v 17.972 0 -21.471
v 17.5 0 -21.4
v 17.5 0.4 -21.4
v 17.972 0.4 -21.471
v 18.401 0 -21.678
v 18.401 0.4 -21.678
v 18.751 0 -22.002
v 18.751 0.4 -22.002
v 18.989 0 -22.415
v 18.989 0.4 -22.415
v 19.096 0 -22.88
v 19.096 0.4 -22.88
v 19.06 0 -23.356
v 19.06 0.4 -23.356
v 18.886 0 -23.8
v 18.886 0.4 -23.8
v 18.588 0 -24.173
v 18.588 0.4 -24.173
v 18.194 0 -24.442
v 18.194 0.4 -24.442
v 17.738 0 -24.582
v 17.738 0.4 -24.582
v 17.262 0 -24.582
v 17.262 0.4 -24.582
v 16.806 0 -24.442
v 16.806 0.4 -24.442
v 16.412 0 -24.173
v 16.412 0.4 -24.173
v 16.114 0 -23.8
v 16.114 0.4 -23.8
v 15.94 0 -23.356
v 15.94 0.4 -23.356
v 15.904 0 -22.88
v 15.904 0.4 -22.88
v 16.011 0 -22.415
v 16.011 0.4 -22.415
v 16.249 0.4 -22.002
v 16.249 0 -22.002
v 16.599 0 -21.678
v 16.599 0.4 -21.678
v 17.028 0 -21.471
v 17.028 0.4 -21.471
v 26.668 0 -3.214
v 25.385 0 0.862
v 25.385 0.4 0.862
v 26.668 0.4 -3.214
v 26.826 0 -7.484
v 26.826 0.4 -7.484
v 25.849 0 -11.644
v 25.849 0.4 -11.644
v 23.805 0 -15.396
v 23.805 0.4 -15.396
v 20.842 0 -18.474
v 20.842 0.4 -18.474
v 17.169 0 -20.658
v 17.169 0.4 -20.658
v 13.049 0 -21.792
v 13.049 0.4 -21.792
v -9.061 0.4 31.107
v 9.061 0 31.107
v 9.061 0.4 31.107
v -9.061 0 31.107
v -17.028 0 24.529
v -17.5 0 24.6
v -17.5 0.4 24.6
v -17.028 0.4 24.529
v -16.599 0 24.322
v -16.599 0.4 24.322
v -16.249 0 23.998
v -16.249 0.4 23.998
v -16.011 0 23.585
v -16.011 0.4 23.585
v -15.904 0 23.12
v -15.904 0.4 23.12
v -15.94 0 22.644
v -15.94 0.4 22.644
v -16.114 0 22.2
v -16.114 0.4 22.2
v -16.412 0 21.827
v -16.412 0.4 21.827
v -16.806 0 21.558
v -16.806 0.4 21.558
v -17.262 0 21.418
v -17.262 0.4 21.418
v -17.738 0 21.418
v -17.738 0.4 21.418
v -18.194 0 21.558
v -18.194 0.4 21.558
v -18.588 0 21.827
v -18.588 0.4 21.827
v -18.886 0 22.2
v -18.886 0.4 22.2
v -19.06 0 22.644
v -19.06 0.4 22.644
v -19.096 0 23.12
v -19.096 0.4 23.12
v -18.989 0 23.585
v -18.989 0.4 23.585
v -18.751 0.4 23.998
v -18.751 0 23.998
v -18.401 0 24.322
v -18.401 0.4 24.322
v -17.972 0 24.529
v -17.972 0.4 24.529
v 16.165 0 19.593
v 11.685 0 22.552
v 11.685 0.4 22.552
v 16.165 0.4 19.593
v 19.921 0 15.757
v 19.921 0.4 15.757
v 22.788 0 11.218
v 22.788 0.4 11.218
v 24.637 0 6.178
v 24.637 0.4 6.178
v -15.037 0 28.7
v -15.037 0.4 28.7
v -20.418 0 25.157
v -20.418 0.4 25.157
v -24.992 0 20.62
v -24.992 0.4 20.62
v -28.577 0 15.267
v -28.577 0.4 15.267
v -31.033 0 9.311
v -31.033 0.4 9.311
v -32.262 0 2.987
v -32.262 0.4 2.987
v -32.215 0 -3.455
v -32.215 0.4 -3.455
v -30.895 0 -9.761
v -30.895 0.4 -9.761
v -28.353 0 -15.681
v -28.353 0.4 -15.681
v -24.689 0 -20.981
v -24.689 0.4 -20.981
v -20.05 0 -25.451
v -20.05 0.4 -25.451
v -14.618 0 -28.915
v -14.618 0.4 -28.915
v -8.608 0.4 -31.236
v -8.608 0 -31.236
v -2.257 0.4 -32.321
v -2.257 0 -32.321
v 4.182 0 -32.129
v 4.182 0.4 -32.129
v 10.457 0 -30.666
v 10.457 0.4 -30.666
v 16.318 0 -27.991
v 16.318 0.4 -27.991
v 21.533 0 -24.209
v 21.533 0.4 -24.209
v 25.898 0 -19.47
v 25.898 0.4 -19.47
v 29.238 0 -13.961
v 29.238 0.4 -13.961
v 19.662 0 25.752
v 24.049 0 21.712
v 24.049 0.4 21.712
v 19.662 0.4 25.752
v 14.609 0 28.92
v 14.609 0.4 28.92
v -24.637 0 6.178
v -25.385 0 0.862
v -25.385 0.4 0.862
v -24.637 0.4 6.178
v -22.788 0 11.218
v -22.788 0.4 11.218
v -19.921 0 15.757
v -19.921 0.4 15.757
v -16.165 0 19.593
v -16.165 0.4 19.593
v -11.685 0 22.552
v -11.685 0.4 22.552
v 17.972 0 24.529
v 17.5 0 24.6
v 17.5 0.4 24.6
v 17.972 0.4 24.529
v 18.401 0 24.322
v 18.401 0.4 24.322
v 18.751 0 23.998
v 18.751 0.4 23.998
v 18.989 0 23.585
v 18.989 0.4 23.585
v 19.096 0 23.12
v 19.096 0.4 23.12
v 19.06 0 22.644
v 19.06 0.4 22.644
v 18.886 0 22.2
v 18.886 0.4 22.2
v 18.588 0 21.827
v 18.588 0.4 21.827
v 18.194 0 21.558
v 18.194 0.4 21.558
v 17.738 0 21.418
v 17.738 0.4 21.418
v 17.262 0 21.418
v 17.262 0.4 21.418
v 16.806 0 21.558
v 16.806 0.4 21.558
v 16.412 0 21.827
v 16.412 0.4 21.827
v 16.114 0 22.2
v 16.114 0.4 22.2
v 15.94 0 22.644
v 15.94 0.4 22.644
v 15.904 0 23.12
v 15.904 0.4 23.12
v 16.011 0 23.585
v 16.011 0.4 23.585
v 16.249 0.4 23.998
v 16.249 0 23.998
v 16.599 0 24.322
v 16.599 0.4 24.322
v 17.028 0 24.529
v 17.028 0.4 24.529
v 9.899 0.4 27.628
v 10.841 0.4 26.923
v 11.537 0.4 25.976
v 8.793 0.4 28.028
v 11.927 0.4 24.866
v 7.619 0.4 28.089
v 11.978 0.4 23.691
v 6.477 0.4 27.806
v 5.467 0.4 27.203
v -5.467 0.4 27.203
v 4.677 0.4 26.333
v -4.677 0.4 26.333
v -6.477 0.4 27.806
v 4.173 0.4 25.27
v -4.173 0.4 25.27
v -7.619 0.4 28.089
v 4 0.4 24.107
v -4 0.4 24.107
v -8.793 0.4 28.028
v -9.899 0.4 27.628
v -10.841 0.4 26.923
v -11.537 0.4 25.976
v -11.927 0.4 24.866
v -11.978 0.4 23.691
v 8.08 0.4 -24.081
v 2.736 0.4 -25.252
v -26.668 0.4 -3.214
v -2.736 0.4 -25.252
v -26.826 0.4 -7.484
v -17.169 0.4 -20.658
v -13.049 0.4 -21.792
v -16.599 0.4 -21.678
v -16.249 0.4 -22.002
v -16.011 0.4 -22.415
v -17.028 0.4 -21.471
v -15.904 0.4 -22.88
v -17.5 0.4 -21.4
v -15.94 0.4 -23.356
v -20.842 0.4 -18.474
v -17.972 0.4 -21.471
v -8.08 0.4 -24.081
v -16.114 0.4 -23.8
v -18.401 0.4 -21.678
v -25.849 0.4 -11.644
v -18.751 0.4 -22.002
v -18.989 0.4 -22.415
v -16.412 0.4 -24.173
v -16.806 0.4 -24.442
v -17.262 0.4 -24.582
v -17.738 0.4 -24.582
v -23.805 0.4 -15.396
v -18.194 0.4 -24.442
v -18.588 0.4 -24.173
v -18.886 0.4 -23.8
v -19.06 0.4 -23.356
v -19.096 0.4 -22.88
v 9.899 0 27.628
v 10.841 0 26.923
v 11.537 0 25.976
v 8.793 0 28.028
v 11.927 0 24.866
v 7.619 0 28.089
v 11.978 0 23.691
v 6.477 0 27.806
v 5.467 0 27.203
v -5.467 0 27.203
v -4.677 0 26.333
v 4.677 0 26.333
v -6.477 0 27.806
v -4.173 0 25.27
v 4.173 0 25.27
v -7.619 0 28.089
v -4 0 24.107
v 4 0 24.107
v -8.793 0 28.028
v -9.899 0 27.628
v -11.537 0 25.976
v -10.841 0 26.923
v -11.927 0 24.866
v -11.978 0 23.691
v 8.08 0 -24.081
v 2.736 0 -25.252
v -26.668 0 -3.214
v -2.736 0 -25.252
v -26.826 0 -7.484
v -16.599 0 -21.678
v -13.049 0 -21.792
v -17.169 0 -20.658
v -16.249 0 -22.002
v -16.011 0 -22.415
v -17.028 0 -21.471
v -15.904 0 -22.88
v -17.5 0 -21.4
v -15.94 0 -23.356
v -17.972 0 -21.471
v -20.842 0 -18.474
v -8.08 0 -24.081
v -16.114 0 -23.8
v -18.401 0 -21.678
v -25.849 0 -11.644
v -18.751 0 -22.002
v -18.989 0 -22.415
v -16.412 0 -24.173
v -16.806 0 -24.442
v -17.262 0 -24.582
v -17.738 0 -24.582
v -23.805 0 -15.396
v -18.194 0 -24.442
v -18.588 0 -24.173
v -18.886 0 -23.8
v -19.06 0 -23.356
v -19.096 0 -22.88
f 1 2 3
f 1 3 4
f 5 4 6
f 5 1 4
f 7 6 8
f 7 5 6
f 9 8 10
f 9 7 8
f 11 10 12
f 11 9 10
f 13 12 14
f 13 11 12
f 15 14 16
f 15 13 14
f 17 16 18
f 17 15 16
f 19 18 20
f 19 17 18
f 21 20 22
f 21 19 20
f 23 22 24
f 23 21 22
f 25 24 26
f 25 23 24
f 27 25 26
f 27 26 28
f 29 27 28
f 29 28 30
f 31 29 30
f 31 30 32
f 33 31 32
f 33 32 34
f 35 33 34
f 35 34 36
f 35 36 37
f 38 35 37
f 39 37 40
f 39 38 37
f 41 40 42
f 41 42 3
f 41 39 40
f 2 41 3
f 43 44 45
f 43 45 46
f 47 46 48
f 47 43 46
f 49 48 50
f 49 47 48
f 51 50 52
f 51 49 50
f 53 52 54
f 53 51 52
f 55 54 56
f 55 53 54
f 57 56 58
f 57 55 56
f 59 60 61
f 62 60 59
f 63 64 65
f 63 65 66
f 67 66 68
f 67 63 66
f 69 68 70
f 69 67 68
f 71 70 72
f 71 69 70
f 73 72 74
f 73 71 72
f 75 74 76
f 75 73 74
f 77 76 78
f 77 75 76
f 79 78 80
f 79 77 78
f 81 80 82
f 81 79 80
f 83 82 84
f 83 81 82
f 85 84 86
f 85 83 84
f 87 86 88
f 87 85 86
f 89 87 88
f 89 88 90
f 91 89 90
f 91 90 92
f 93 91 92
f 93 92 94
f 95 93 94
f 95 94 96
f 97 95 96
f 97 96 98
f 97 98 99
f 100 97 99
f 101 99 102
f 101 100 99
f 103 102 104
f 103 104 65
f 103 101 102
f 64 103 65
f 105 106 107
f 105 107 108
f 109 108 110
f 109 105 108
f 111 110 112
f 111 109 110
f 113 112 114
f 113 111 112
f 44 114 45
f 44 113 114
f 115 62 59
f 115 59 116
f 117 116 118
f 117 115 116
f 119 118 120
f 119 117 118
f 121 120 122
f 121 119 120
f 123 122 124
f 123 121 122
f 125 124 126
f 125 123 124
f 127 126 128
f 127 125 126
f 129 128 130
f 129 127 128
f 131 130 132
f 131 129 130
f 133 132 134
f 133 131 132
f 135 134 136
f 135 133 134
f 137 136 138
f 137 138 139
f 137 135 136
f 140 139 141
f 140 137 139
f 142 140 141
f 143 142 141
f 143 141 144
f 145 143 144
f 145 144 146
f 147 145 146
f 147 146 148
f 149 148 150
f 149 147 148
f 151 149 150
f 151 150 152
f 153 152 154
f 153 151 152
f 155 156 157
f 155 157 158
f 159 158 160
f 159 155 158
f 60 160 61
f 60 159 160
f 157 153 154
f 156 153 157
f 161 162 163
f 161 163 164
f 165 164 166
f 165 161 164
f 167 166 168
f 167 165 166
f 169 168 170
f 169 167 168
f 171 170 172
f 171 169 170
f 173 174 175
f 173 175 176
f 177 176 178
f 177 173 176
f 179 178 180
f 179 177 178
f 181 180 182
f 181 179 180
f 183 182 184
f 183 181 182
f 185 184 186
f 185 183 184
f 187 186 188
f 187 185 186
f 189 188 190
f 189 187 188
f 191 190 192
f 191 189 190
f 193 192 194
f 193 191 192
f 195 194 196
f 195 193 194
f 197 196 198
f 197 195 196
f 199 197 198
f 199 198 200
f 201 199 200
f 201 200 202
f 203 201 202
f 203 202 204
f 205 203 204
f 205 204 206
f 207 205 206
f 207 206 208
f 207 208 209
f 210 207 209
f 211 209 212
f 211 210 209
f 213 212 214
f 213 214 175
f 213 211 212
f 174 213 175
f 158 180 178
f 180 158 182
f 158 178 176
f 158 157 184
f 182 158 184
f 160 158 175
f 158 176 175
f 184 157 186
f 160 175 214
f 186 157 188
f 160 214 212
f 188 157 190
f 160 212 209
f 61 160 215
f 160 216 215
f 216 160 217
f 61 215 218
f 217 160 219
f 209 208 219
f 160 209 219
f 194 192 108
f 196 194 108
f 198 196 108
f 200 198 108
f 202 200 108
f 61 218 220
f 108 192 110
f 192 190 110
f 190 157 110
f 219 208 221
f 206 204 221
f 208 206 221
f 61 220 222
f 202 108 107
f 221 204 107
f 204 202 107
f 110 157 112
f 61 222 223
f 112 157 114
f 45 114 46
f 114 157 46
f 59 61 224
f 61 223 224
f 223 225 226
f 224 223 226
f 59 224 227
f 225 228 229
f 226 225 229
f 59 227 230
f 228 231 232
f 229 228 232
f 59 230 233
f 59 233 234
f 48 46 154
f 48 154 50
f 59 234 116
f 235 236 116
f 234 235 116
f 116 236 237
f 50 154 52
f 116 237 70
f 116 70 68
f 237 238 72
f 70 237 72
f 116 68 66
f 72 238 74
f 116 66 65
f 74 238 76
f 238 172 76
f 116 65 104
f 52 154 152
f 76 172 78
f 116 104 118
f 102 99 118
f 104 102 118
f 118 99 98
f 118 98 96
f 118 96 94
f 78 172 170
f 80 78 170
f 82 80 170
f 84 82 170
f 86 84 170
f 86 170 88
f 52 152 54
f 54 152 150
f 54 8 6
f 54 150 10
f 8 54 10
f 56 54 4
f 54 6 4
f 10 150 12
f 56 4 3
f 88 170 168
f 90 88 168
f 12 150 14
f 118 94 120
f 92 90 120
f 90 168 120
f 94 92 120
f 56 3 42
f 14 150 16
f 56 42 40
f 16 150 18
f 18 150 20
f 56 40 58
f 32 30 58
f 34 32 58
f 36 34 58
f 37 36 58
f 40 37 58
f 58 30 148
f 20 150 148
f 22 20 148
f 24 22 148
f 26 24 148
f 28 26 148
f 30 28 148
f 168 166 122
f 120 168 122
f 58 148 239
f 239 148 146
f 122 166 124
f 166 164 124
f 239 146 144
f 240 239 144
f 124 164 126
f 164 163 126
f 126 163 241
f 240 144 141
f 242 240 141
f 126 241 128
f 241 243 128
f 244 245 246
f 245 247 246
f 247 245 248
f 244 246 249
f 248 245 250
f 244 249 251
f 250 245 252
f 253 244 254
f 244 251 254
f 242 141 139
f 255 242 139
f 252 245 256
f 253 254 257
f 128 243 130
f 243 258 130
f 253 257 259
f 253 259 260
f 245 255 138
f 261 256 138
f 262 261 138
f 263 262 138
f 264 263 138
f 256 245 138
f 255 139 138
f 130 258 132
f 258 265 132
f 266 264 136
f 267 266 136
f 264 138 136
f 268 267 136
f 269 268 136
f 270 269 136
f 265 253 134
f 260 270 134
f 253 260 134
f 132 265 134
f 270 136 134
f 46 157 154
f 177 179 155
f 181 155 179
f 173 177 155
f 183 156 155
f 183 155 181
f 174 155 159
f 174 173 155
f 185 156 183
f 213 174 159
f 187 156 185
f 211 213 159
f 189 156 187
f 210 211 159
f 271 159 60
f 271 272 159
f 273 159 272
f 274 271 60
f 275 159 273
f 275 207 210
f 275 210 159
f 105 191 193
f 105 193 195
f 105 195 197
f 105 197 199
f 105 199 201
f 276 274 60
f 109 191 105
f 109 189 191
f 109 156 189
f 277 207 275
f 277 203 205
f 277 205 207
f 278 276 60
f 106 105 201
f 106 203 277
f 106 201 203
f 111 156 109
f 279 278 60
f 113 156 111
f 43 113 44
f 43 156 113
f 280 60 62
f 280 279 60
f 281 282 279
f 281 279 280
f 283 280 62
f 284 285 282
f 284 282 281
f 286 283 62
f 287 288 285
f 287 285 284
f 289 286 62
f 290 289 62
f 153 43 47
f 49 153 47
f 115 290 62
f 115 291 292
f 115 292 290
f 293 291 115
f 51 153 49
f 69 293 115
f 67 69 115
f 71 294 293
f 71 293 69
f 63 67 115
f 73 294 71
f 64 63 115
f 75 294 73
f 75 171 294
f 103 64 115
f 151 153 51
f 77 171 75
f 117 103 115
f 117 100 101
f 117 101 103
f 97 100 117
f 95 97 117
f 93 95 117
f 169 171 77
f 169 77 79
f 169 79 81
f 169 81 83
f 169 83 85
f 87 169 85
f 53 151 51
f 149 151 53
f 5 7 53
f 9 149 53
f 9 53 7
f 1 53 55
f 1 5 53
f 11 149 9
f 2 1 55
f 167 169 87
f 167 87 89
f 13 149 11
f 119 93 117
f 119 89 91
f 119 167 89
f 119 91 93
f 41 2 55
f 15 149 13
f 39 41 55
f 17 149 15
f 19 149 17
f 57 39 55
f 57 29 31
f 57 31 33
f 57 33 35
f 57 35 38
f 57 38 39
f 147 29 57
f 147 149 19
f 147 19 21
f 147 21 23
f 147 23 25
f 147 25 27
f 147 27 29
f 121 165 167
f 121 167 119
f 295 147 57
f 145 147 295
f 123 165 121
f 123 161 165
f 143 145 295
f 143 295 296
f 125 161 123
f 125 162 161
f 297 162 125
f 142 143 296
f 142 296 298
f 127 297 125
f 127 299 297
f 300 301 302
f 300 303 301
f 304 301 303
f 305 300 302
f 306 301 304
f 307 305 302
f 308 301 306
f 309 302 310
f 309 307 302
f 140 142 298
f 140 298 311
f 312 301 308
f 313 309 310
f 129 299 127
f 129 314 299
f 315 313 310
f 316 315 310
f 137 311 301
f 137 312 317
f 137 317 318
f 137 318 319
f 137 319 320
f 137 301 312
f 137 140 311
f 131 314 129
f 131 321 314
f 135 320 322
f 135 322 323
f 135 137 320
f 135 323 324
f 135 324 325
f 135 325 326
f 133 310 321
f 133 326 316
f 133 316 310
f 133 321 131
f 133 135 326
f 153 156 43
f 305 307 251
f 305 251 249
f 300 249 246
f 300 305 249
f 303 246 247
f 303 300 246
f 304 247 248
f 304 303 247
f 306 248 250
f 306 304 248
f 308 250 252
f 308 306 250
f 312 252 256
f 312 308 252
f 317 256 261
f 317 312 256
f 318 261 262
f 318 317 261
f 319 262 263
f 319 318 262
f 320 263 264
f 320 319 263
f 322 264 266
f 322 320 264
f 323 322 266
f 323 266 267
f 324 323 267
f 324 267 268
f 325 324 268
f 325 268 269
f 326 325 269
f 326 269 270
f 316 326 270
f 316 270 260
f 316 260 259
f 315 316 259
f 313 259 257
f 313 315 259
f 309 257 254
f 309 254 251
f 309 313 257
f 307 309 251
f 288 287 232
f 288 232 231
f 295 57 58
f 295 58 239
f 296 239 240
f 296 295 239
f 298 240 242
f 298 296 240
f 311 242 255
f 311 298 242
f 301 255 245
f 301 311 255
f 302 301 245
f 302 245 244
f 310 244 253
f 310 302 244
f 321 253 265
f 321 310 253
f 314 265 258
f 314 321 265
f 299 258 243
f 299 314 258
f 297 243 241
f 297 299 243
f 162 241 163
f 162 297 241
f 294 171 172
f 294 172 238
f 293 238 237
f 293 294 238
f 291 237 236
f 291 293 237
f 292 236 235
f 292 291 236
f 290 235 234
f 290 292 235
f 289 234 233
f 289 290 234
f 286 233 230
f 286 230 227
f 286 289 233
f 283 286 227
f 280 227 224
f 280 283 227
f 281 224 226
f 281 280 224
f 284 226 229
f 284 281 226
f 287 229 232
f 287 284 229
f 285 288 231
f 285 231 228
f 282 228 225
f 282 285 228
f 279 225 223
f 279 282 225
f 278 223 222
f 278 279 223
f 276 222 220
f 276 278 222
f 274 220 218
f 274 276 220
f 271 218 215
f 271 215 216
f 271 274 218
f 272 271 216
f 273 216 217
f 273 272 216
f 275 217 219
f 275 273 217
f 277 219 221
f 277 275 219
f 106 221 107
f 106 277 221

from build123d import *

# Parameters (mm, degrees)
SKETCH1_R           = 1.6
BOSS_EXTRUDE1_DEPTH = 0.4


with BuildPart() as part:
    # Sketch1 → Boss-Extrude1 (new body)
    with BuildSketch(Plane(origin=(0, 0, 0), x_dir=(1, 0, 0), z_dir=(0, 1, 0))):
        with BuildLine():
            Line((29.237843605, 13.960963482), (24.049079653, -21.711788683))
            ThreePointArc((24.049079653, -21.711788683), (17.208573183, -27.452231403), (9.060814288, -31.107260317))
            Line((9.060814288, -31.107260317), (-9.060814288, -31.107260317))
            ThreePointArc((-9.060814288, -31.107260317), (-24.689356555, 20.980840614), (29.237843605, 13.960963482))
        make_face()
        with Locations(Location((-17.5, 23, 0), (0, 0, 270))):
            Circle(SKETCH1_R, mode=Mode.SUBTRACT)
        with Locations(Location((-17.5, -23, 0), (0, 0, 270))):
            Circle(SKETCH1_R, mode=Mode.SUBTRACT)
        with Locations(Location((17.5, -23, 0), (0, 0, 270))):
            Circle(SKETCH1_R, mode=Mode.SUBTRACT)
        with Locations(Location((17.5, 23, 0), (0, 0, 270))):
            Circle(SKETCH1_R, mode=Mode.SUBTRACT)
        with BuildLine():
            Line((-4, -24.107260317), (4, -24.107260317))
            ThreePointArc((4, -24.107260317), (8.793181532, -28.027829543), (11.685431528, -22.552398764))
            ThreePointArc((11.685431528, -22.552398764), (21.475216761, -13.563740822), (25.385385277, -0.861518628))
            ThreePointArc((25.385385277, -0.861518628), (24.952949632, 13.588699396), (13.048984262, 21.791833556))
            ThreePointArc((13.048984262, 21.791833556), (0, 25.4), (-13.048984262, 21.791833556))
            ThreePointArc((-13.048984262, 21.791833556), (-24.952949632, 13.588699396), (-25.385385277, -0.861518628))
            ThreePointArc((-25.385385277, -0.861518628), (-21.475216761, -13.563740822), (-11.685431528, -22.552398764))
            ThreePointArc((-11.685431528, -22.552398764), (-8.793181532, -28.027829543), (-4, -24.107260317))
        make_face(mode=Mode.SUBTRACT)
    extrude(amount=BOSS_EXTRUDE1_DEPTH)


solid = part.part
